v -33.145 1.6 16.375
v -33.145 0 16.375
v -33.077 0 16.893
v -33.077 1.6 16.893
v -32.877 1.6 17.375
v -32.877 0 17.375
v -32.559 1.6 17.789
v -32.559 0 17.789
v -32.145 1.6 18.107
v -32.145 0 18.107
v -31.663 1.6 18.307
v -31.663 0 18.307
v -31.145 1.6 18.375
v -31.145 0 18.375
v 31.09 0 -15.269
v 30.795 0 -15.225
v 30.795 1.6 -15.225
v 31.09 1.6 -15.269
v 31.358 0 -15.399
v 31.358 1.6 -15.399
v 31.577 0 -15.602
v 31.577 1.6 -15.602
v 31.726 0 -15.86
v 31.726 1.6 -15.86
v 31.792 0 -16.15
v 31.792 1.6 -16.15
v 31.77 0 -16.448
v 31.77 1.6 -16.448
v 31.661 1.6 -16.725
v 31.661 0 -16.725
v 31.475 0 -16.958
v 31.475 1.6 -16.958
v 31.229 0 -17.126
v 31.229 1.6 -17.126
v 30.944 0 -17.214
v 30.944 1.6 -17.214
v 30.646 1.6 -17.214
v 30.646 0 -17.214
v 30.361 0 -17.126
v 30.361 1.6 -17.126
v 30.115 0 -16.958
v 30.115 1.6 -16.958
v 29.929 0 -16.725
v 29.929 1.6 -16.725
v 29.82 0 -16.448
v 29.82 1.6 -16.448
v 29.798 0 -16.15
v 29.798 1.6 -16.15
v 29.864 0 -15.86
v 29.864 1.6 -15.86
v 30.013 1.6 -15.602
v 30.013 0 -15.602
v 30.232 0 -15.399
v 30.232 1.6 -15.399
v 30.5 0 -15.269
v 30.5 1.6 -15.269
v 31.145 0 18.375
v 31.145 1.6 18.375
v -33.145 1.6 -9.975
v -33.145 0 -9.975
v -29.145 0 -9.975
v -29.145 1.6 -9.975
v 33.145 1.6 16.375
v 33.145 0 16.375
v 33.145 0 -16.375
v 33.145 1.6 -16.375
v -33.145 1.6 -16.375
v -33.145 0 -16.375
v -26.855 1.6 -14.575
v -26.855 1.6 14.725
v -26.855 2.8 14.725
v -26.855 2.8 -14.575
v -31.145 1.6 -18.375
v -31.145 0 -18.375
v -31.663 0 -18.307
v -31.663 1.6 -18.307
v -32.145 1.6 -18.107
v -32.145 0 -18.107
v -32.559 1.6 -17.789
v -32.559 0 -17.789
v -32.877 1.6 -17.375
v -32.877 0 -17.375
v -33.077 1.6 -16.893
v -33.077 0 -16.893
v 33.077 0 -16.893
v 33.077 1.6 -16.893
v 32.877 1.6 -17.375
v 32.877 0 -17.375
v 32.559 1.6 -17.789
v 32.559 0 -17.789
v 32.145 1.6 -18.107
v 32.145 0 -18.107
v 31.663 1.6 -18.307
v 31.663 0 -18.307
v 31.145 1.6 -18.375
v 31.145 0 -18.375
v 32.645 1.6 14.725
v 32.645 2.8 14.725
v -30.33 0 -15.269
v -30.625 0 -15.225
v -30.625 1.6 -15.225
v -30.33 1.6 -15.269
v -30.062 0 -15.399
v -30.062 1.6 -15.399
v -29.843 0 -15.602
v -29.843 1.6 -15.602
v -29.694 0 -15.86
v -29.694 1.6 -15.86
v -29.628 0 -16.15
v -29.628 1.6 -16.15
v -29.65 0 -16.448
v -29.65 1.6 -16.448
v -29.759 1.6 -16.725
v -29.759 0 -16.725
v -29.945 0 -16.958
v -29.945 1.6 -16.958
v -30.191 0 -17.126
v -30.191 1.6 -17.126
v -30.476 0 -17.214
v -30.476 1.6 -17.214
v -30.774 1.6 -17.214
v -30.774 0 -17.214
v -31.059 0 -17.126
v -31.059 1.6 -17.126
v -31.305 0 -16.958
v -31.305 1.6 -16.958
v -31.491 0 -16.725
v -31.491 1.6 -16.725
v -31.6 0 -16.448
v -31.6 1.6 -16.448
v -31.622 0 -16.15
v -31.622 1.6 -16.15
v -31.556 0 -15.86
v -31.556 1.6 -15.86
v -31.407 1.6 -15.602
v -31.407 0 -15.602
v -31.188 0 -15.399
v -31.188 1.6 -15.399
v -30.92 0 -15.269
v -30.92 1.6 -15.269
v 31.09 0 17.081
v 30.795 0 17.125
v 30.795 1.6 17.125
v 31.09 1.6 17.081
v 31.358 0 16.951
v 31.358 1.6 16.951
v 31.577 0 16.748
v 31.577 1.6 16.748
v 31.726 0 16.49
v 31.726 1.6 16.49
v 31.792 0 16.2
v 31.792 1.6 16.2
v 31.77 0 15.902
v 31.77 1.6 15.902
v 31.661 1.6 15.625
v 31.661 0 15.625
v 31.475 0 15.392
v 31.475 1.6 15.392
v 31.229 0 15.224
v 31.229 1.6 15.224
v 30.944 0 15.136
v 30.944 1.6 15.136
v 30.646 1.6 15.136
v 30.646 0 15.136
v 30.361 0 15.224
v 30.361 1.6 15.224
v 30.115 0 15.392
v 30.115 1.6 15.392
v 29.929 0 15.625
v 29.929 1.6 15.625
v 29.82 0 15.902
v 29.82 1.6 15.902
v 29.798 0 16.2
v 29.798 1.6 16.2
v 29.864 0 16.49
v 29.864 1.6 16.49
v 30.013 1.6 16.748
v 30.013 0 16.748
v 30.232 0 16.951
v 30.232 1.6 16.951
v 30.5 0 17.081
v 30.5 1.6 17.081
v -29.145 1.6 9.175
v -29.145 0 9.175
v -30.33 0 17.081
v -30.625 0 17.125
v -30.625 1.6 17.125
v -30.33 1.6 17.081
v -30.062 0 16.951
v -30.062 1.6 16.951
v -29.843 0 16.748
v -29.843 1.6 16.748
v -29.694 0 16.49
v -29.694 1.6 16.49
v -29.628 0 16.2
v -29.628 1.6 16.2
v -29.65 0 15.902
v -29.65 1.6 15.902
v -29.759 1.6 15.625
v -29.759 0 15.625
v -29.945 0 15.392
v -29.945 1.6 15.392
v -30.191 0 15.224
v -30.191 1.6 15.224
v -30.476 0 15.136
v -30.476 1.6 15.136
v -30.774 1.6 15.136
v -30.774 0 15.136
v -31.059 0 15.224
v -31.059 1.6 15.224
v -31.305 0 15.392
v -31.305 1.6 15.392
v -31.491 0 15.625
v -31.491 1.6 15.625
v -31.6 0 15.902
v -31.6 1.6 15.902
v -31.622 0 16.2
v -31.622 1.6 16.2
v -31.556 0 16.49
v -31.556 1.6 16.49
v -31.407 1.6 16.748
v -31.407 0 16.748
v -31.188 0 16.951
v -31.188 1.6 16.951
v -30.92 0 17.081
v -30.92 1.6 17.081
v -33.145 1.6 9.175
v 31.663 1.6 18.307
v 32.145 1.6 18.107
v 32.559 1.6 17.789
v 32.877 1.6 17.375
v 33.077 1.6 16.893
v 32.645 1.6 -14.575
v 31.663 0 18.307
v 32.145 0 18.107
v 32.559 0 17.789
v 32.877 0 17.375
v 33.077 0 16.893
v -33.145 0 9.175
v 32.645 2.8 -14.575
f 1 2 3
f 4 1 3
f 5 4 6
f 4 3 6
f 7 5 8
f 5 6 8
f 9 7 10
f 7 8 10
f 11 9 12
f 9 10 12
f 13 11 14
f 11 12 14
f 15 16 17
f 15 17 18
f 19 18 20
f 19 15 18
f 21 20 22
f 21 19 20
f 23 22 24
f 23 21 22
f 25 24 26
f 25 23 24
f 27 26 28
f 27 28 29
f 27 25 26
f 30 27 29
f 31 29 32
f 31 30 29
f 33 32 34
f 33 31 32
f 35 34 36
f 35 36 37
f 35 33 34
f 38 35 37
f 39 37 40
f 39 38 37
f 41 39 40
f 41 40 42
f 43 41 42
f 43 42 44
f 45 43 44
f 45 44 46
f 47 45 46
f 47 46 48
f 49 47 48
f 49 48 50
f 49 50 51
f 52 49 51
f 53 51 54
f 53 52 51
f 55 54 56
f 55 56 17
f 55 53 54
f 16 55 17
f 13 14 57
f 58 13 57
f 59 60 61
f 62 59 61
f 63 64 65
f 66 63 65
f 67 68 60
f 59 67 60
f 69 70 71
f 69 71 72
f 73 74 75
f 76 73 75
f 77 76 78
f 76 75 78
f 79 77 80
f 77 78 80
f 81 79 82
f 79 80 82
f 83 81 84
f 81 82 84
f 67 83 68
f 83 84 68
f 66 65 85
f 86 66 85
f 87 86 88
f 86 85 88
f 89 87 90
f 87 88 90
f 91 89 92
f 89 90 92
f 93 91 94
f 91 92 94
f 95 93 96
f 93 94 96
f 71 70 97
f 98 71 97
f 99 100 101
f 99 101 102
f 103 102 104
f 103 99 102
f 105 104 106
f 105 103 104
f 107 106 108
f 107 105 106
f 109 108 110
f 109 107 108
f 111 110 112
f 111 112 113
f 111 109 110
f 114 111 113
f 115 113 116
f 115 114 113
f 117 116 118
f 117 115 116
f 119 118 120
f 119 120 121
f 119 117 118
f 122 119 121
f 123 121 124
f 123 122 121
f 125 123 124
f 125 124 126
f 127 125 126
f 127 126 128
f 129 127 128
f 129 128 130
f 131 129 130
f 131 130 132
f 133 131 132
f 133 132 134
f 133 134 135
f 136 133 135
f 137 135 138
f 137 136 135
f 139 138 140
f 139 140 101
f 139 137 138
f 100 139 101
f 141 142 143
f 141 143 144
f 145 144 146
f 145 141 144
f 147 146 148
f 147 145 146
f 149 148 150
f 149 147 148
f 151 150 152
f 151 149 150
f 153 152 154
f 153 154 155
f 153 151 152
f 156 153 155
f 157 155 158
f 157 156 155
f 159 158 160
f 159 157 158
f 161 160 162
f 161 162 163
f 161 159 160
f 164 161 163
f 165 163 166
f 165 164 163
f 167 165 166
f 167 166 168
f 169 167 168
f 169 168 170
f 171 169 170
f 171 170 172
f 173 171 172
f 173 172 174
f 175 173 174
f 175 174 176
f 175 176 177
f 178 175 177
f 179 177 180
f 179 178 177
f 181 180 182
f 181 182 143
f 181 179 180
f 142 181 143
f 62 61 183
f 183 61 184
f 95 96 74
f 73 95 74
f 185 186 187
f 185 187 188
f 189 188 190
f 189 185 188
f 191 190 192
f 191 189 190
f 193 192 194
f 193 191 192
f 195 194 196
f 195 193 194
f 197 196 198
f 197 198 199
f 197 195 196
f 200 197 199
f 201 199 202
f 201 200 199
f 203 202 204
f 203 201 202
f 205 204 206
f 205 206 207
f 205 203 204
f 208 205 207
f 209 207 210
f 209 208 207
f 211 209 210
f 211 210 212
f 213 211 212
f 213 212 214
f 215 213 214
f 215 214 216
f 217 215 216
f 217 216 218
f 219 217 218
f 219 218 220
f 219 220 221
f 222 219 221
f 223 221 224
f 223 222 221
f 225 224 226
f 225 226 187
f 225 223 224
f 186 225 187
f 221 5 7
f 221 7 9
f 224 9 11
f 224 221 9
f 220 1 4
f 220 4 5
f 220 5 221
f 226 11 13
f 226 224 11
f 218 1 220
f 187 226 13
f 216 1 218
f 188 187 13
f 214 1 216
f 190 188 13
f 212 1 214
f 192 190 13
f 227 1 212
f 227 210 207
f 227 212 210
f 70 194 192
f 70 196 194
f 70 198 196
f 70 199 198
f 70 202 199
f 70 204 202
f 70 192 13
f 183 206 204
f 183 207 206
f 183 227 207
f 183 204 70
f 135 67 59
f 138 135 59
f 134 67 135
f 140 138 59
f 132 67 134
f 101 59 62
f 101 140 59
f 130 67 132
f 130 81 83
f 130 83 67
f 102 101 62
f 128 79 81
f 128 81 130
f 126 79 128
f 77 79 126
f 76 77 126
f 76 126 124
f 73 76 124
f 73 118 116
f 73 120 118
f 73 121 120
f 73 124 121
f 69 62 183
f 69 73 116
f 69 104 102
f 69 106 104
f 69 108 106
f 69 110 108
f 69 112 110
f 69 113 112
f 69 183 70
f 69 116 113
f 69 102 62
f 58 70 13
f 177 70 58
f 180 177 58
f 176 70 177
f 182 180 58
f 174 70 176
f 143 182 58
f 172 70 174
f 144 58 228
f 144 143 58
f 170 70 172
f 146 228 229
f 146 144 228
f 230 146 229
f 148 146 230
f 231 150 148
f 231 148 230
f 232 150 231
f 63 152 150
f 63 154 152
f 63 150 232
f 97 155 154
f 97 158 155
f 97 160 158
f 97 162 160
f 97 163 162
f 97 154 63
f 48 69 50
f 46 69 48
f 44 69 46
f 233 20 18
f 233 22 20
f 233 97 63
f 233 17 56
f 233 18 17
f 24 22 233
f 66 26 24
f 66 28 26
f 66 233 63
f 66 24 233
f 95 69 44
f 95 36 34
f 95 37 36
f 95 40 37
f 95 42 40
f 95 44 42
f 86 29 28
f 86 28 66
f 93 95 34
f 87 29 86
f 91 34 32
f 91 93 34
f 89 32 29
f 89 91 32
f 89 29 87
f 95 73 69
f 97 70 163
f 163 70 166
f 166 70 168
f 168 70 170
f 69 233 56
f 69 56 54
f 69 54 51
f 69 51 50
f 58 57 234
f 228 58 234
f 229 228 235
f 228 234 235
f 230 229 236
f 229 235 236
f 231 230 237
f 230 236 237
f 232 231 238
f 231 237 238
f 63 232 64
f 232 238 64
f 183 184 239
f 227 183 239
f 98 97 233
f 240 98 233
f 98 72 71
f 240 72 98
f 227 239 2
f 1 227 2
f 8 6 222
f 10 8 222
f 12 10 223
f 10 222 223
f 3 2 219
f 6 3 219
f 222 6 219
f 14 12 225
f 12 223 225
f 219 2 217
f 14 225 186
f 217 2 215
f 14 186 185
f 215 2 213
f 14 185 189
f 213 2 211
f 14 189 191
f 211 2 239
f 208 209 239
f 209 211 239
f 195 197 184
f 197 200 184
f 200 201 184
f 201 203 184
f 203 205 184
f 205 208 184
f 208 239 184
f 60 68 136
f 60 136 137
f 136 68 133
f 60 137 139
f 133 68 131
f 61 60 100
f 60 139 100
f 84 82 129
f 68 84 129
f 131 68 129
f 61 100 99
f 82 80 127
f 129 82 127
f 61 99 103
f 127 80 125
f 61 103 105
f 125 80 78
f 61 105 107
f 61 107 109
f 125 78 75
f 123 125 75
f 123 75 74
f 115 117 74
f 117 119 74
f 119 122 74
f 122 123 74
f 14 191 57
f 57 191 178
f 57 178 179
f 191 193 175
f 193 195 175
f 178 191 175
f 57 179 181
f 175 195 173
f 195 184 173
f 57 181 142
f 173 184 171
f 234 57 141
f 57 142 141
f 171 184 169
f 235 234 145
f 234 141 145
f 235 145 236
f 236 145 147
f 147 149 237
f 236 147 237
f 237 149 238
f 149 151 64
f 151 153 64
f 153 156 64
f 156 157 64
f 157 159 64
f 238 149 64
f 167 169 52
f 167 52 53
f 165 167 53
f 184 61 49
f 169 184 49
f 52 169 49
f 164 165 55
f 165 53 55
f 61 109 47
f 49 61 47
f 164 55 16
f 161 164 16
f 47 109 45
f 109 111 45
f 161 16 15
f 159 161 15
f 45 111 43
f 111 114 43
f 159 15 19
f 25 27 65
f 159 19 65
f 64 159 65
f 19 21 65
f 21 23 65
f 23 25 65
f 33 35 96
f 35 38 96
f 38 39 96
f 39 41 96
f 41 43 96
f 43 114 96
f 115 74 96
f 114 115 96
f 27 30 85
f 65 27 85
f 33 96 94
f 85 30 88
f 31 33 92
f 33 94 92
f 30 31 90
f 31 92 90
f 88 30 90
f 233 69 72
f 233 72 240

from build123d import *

# Parameters (mm, degrees)
SKETCH1_R           = 1
BOSS_EXTRUDE1_DEPTH = 1.6
SKETCH2_W           = 59.5
SKETCH2_H           = 29.3
BOSS_EXTRUDE2_DEPTH = 1.2


with BuildPart() as part:
    # Sketch1 → Boss-Extrude1 (new body)
    with BuildSketch(Plane(origin=(0, 0, 0), x_dir=(1, 0, 0), z_dir=(0, 1, 0))):
        with BuildLine():
            Line((-33.145, -9.175), (-33.145, -16.375))
            ThreePointArc((-33.145, -16.375), (-32.559213562, -17.789213562), (-31.145, -18.375))
            Line((-31.145, -18.375), (31.145, -18.375))
            ThreePointArc((31.145, -18.375), (32.559213562, -17.789213562), (33.145, -16.375))
            Line((33.145, -16.375), (33.145, 16.375))
            ThreePointArc((33.145, 16.375), (32.559213562, 17.789213562), (31.145, 18.375))
            Line((31.145, 18.375), (-31.145, 18.375))
            ThreePointArc((-31.145, 18.375), (-32.559213562, 17.789213562), (-33.145, 16.375))
            Line((-33.145, 16.375), (-33.145, 9.975))
            Line((-33.145, 9.975), (-29.145, 9.975))
            Line((-29.145, 9.975), (-29.145, -9.175))
            Line((-29.145, -9.175), (-33.145, -9.175))
        make_face()
        with Locations(Location((-30.625, -16.125, 0), (0, 0, 270))):
            Circle(SKETCH1_R, mode=Mode.SUBTRACT)
        with Locations(Location((30.795, -16.125, 0), (0, 0, 270))):
            Circle(SKETCH1_R, mode=Mode.SUBTRACT)
        with Locations(Location((30.795, 16.225, 0), (0, 0, 270))):
            Circle(SKETCH1_R, mode=Mode.SUBTRACT)
        with Locations(Location((-30.625, 16.225, 0), (0, 0, 270))):
            Circle(SKETCH1_R, mode=Mode.SUBTRACT)
    extrude(amount=BOSS_EXTRUDE1_DEPTH)

    # Sketch2 → Boss-Extrude2 (add)
    with BuildSketch(Plane(origin=(0, 1.6, 0), x_dir=(1, 0, 0), z_dir=(0, 1, 0))):
        with Locations((2.895, -0.075)):
            Rectangle(SKETCH2_W, SKETCH2_H)
    extrude(amount=BOSS_EXTRUDE2_DEPTH)


solid = part.part
